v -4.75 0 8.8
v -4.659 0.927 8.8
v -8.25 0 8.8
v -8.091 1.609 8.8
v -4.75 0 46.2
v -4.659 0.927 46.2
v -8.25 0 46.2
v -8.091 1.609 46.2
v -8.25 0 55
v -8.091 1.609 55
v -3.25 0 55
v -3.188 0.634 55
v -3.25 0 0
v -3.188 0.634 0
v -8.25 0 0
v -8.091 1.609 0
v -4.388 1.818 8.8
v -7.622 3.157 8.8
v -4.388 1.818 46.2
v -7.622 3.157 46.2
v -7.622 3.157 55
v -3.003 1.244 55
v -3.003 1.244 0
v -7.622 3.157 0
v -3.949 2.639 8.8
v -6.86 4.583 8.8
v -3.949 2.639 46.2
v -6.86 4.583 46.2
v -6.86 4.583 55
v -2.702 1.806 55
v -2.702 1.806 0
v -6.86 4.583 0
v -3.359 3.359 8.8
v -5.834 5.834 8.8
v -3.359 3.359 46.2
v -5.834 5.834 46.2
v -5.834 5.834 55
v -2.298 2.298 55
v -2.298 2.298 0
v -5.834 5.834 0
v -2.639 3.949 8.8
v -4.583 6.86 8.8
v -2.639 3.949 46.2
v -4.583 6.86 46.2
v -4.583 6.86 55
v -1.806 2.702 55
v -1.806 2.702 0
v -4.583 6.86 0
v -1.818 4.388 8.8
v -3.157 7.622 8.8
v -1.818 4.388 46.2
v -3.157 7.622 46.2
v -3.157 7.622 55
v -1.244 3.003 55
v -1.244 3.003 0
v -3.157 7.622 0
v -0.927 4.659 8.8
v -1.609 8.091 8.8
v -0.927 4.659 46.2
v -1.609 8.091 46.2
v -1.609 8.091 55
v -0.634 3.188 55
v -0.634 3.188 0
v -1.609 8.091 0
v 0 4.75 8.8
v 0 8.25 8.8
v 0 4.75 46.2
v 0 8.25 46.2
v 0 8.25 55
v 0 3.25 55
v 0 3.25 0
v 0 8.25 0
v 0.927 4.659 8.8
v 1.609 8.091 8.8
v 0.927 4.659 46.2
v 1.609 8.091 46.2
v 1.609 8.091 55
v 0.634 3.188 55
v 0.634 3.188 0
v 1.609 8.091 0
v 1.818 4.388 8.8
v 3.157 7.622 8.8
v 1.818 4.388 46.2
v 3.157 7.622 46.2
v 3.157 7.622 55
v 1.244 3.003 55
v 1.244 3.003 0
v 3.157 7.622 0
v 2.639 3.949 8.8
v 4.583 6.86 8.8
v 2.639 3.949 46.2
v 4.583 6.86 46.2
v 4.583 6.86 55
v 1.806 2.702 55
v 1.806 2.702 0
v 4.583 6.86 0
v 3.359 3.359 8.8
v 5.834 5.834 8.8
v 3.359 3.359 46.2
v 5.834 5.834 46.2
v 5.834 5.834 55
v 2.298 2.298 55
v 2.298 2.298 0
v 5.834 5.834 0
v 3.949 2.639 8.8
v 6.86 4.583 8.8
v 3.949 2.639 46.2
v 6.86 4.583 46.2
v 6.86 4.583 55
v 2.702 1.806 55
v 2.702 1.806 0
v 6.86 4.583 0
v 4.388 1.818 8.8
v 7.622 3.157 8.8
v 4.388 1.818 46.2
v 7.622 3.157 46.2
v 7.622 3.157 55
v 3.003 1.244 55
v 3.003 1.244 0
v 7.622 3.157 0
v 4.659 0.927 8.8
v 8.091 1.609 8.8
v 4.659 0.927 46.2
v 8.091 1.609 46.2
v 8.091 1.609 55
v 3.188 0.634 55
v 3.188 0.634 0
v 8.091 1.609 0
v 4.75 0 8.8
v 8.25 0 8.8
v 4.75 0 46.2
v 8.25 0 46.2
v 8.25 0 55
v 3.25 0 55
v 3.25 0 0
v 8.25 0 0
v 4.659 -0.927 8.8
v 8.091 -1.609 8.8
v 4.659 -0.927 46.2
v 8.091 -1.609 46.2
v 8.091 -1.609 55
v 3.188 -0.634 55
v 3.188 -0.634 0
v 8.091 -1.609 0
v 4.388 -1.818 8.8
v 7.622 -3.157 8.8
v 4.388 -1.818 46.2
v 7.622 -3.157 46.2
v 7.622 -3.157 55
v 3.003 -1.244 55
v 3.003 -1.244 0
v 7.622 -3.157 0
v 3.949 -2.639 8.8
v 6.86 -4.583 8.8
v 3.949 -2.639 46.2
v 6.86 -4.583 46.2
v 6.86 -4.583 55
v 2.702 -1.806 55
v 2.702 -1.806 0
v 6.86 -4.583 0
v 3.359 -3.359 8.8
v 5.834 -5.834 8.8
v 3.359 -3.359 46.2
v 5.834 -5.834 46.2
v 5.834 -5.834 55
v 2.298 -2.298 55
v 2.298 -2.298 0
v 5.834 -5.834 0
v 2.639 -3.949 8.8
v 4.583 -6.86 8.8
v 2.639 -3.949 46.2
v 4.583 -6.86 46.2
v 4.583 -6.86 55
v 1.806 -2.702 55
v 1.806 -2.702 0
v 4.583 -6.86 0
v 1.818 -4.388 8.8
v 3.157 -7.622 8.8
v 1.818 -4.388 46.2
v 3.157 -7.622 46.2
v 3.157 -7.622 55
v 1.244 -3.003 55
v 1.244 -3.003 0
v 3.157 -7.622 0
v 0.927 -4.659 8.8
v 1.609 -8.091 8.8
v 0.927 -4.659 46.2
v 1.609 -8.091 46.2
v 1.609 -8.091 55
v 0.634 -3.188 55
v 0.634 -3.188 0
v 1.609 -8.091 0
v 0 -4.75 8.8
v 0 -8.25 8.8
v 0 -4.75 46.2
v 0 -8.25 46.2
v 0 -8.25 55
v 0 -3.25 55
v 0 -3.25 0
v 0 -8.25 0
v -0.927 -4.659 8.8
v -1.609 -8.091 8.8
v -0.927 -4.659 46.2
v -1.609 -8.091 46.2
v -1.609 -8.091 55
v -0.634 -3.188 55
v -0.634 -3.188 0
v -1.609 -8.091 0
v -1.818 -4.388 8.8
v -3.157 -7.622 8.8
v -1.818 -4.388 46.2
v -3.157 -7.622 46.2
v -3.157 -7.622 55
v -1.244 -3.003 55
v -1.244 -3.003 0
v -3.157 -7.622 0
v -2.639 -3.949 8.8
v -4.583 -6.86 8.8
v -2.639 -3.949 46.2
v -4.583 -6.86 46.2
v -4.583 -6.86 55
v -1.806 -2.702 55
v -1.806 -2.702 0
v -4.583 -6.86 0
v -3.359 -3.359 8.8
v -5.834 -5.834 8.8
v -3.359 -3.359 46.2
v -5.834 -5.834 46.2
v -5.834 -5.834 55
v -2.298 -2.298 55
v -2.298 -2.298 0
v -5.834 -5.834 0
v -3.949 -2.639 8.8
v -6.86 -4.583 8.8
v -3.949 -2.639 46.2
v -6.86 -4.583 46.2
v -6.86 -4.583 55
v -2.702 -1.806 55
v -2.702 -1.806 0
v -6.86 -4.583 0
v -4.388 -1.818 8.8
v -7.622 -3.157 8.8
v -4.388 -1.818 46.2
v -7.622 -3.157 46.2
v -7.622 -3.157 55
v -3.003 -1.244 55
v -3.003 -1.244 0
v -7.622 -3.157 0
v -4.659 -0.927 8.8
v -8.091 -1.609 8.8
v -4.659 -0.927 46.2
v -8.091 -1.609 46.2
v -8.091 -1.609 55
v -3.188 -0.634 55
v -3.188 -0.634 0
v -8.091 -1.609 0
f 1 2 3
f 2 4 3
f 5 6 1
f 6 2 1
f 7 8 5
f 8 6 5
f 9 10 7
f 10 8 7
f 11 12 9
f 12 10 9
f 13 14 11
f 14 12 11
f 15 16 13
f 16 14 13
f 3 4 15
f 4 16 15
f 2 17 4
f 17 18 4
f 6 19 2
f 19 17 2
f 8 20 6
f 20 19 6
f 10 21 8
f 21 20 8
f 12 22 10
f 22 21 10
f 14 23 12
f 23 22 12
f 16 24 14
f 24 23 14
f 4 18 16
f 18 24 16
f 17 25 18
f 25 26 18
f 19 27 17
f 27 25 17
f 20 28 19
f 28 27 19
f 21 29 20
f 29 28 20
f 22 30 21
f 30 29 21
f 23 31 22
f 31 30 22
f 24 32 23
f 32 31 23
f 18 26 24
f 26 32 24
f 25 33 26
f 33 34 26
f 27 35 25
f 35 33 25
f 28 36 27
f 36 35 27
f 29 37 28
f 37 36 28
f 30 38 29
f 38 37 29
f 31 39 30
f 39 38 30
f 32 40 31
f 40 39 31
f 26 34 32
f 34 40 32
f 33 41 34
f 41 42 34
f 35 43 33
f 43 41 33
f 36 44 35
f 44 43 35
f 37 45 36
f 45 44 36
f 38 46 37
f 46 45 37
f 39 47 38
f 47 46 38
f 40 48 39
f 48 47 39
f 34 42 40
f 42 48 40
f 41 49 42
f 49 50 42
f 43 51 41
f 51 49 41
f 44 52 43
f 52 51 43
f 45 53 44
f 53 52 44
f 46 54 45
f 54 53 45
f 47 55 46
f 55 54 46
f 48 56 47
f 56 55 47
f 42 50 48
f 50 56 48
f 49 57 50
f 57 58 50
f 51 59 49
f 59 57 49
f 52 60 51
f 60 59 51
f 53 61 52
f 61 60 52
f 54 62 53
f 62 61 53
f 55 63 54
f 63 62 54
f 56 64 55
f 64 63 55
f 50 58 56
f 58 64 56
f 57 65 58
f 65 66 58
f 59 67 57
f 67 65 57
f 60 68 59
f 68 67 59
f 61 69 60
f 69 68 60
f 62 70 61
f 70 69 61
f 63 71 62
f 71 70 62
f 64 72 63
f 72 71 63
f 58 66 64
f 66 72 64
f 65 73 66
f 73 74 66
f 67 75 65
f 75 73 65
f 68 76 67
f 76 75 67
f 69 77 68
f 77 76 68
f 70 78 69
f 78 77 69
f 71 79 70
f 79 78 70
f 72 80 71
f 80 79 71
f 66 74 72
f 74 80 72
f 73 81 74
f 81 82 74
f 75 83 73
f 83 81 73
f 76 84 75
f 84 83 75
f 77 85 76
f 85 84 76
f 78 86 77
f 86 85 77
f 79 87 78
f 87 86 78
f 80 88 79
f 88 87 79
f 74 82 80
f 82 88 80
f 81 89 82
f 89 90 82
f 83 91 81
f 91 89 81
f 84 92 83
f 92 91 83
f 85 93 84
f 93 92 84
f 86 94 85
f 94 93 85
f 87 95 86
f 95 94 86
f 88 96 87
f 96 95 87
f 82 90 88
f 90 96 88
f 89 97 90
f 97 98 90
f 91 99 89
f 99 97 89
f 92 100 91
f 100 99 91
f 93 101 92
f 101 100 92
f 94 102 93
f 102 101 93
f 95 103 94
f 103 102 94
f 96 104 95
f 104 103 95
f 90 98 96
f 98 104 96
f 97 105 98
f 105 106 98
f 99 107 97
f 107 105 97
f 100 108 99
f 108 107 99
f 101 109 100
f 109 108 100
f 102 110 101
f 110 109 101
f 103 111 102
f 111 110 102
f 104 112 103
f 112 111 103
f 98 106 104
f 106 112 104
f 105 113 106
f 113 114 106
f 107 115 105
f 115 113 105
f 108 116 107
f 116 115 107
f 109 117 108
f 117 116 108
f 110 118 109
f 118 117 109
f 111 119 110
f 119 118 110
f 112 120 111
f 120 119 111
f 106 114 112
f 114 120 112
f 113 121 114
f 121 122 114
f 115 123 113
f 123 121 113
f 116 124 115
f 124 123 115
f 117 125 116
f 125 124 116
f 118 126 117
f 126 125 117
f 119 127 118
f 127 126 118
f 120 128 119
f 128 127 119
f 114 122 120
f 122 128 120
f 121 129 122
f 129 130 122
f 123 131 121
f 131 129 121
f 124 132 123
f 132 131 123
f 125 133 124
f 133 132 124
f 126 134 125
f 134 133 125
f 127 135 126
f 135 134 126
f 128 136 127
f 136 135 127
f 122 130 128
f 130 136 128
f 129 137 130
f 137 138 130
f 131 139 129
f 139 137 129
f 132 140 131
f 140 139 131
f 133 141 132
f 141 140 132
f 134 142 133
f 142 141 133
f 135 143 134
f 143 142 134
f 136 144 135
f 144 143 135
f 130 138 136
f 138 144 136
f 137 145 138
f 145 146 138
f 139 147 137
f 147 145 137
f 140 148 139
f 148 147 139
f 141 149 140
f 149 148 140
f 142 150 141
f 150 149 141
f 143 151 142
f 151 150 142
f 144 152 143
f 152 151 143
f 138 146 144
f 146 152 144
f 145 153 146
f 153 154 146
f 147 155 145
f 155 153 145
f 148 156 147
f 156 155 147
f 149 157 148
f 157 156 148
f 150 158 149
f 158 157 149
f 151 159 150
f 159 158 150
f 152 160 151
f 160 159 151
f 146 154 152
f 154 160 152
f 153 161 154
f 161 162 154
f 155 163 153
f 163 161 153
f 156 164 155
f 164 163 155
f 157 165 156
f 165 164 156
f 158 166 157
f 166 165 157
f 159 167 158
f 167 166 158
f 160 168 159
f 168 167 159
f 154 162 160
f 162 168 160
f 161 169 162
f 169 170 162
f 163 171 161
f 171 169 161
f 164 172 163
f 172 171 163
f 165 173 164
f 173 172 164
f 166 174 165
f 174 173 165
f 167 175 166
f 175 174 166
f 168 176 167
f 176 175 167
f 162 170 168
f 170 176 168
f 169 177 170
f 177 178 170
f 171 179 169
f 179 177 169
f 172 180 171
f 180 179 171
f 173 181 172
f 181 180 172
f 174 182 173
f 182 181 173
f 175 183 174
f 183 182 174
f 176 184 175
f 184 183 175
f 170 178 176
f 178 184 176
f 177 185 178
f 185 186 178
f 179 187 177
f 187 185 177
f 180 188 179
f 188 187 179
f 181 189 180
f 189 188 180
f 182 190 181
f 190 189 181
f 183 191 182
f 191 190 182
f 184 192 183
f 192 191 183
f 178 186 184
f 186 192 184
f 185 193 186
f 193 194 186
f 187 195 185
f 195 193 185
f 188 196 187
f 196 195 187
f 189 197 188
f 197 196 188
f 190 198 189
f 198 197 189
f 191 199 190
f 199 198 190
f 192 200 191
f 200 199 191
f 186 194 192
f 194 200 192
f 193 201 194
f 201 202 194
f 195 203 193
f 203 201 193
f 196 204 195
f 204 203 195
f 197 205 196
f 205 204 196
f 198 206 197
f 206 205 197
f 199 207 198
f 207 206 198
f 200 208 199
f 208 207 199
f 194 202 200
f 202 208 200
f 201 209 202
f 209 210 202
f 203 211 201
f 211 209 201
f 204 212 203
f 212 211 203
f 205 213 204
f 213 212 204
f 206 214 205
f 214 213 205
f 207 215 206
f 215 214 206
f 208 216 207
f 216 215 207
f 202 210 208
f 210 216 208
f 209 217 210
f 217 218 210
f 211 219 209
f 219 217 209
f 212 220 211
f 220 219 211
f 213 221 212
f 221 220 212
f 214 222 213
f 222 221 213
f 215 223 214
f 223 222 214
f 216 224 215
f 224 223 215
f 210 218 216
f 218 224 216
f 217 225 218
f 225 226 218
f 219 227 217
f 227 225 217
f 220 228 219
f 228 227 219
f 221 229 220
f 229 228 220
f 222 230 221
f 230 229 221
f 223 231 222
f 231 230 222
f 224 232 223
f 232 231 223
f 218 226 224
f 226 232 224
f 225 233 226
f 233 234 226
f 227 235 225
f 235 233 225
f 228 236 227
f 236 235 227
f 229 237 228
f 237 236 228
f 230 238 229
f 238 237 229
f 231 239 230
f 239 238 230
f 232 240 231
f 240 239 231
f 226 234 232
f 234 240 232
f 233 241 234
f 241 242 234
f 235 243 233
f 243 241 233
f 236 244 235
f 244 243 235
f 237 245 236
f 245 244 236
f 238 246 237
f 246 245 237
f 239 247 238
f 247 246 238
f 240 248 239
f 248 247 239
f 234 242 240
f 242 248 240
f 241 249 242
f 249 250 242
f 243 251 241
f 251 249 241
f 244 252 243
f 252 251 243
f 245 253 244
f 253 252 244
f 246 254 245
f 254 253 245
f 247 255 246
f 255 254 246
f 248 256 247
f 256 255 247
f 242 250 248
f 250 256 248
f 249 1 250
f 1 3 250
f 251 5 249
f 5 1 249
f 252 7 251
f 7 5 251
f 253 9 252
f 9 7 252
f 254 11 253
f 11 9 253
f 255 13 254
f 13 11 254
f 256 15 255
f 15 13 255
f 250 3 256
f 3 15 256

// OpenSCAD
$fn = 32;

// ----------------------------------------------------------------------
// Profiled standoff: spool spacer, 55 mm long, bore 6.5 mm
// ----------------------------------------------------------------------

// --- parameters (mm) ---
revolve_angle = 360;      // full turn around the Z axis
profile_points = 8;       // points of the closed outline

profile = [[3.25, 0], [8.25, 0], [8.25, 8.8], [4.75, 8.8], [4.75, 46.2], [8.25, 46.2], [8.25, 55], [3.25, 55]];  // single closed polygon, 8 points, counter clockwise

// --- the one profile operation ---
rotate_extrude(angle = revolve_angle) polygon(points = profile);
